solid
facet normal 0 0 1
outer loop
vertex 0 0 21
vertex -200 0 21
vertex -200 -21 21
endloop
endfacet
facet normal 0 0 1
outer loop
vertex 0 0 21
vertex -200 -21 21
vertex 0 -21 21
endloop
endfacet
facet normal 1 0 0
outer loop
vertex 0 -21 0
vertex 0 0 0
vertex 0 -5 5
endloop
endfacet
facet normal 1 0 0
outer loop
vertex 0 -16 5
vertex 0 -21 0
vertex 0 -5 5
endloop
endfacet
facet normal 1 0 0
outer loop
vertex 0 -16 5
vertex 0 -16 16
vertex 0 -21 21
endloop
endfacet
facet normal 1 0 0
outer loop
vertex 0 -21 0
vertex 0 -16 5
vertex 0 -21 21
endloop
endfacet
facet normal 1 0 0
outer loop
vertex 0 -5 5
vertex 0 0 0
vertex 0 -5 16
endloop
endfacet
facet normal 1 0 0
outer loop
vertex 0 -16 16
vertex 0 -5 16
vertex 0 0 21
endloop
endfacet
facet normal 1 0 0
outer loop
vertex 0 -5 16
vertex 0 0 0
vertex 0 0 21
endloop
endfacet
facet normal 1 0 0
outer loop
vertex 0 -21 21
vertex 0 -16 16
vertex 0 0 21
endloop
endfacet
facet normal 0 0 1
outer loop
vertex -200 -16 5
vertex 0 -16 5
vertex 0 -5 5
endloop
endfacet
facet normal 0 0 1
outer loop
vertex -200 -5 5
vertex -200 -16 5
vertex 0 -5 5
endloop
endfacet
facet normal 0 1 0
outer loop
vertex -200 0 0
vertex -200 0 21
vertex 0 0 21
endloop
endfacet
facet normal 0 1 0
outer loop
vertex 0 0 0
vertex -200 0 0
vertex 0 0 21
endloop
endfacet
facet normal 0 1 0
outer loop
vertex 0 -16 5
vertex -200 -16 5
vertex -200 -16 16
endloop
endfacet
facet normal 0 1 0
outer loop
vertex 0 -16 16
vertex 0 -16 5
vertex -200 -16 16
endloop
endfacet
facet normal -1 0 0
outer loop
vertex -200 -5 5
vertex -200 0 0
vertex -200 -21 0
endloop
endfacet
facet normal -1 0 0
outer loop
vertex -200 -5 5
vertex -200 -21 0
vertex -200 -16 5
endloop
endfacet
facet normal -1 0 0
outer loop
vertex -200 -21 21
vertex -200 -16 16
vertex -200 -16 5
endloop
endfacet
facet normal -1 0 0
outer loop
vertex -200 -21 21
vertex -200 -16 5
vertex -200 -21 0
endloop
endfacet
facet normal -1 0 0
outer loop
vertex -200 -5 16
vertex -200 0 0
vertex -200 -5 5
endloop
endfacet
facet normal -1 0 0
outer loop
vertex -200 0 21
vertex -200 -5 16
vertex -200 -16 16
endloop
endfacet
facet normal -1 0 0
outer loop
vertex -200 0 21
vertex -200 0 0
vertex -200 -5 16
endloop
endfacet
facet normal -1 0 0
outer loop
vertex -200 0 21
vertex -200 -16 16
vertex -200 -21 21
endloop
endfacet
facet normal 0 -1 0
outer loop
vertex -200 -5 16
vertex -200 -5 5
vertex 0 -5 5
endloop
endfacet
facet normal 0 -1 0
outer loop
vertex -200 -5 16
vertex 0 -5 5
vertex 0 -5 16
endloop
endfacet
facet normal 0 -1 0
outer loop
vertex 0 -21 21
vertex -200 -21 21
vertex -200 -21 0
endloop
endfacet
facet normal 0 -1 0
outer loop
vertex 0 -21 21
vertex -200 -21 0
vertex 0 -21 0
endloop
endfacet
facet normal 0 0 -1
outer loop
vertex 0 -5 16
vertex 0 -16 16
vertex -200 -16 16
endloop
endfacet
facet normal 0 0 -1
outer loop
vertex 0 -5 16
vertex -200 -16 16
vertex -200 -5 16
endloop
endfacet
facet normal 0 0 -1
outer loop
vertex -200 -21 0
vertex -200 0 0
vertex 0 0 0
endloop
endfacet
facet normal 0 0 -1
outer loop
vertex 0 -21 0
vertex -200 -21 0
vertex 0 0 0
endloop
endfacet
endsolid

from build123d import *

# Parameters (mm, degrees)
F0_W     = 200
F0_H     = 21
F1_DEPTH = 21
F2_W     = 11
F2_H     = 11
F3_DEPTH = 200


with BuildPart() as f1:
    # F0 (on Front) → F1 (new body)
    with BuildSketch(Plane.XZ):
        with Locations((-100, 10.5)):
            Rectangle(F0_W, F0_H)
    extrude(amount=F1_DEPTH)

    # F2 (on Right) → F3 (cut)
    with BuildSketch(Plane.YZ):
        with Locations((-10.5, 10.5)):
            Rectangle(F2_W, F2_H)
    extrude(amount=-F3_DEPTH, mode=Mode.SUBTRACT)


solid = f1.part
